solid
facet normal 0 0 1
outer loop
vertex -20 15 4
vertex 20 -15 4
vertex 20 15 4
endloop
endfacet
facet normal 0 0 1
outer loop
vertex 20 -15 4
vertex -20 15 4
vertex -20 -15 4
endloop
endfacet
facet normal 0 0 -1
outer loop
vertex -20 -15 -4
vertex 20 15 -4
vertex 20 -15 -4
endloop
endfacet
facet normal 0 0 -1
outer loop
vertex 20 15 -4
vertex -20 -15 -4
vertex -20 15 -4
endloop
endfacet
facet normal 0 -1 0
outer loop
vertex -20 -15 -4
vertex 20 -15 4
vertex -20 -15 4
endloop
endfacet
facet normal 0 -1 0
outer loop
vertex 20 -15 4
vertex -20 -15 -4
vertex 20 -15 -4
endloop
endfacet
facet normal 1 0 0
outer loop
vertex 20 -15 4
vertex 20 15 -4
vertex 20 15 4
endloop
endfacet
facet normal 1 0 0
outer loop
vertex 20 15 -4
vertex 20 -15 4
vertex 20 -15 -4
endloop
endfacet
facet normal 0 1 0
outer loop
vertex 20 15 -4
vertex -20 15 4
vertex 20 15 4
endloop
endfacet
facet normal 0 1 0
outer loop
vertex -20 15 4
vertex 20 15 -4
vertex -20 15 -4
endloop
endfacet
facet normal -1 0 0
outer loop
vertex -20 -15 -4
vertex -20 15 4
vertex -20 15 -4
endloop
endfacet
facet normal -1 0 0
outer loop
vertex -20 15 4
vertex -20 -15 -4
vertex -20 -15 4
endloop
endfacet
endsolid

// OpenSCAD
// Rectangular Solid Box with Dimensions 40mm x 30mm x 8mm
// Centered at origin for easy placement

difference() {
    // Main box body - centered in X and Y axes
    cube([40, 30, 8], center = true);
}
